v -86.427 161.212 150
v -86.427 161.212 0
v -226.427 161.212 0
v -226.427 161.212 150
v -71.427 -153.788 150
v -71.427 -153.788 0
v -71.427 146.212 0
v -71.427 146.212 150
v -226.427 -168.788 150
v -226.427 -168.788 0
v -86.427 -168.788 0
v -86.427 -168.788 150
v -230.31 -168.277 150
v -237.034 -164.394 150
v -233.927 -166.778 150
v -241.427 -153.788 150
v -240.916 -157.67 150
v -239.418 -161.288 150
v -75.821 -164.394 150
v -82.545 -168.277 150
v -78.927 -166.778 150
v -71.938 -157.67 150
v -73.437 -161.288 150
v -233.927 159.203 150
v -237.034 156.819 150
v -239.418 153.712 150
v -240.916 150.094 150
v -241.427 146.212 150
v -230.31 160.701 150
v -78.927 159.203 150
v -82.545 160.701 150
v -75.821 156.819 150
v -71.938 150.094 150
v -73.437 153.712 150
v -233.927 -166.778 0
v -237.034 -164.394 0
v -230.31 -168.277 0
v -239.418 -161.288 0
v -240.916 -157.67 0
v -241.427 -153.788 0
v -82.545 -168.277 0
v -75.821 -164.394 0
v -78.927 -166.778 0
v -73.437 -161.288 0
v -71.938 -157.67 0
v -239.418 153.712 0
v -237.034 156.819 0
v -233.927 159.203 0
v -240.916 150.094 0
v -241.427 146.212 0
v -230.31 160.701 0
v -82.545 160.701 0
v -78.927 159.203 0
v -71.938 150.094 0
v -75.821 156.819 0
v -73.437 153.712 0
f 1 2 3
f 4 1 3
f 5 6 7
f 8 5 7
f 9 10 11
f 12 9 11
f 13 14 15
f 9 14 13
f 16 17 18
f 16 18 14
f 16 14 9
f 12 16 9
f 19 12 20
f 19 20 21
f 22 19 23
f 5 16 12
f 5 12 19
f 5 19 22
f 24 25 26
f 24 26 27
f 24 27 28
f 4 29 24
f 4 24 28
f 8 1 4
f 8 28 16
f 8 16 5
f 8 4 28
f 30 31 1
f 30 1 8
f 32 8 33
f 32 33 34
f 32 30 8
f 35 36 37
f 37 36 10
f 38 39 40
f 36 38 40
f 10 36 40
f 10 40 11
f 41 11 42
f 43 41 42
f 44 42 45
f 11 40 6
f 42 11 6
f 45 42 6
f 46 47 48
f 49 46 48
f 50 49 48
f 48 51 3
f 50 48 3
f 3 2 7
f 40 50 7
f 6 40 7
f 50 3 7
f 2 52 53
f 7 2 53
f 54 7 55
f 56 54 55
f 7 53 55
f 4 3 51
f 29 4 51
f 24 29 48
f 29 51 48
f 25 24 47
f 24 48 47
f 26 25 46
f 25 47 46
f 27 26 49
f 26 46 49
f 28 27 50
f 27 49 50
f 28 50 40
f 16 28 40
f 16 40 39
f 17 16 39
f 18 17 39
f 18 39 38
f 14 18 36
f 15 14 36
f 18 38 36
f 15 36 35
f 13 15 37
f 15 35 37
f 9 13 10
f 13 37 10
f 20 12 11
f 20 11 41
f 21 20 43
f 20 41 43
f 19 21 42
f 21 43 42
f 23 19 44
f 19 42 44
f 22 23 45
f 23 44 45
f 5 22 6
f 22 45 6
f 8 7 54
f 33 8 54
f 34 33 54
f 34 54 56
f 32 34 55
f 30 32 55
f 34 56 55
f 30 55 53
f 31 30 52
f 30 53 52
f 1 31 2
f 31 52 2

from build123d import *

# Parameters (mm, degrees)
F0_W     = 170
F0_H     = 112.08073
F1_DEPTH = 150


with BuildPart() as f1:
    # F0 (on Top) → F1 (new body)
    with BuildSketch(Plane.XY):
        with BuildLine():
            Line((-71.427317, -55.177711), (-241.427317, -55.177711))
            Line((-241.427317, -55.177711), (-241.427317, -153.787855))
            ThreePointArc((-241.427317, -153.787855), (-237.033919, -164.394457), (-226.427317, -168.787855))
            Line((-226.427317, -168.787855), (-86.427317, -168.787855))
            ThreePointArc((-86.427317, -168.787855), (-75.820715, -164.394457), (-71.427317, -153.787855))
            Line((-71.427317, -153.787855), (-71.427317, -68.148904))
            Line((-71.427317, -68.148904), (-71.427317, -55.177711))
        make_face()
        with Locations((-156.427317, 0.862654)):
            Rectangle(F0_W, F0_H)
        with BuildLine():
            Line((-86.427317, 161.212145), (-226.427317, 161.212145))
            ThreePointArc((-226.427317, 161.212145), (-237.033919, 156.818747), (-241.427317, 146.212145))
            Line((-241.427317, 146.212145), (-241.427317, 56.903019))
            Line((-241.427317, 56.903019), (-71.427317, 56.903019))
            Line((-71.427317, 56.903019), (-71.427317, 68.148904))
            Line((-71.427317, 68.148904), (-71.427317, 146.212145))
            ThreePointArc((-71.427317, 146.212145), (-75.820715, 156.818747), (-86.427317, 161.212145))
        make_face()
    extrude(amount=F1_DEPTH)


solid = f1.part
